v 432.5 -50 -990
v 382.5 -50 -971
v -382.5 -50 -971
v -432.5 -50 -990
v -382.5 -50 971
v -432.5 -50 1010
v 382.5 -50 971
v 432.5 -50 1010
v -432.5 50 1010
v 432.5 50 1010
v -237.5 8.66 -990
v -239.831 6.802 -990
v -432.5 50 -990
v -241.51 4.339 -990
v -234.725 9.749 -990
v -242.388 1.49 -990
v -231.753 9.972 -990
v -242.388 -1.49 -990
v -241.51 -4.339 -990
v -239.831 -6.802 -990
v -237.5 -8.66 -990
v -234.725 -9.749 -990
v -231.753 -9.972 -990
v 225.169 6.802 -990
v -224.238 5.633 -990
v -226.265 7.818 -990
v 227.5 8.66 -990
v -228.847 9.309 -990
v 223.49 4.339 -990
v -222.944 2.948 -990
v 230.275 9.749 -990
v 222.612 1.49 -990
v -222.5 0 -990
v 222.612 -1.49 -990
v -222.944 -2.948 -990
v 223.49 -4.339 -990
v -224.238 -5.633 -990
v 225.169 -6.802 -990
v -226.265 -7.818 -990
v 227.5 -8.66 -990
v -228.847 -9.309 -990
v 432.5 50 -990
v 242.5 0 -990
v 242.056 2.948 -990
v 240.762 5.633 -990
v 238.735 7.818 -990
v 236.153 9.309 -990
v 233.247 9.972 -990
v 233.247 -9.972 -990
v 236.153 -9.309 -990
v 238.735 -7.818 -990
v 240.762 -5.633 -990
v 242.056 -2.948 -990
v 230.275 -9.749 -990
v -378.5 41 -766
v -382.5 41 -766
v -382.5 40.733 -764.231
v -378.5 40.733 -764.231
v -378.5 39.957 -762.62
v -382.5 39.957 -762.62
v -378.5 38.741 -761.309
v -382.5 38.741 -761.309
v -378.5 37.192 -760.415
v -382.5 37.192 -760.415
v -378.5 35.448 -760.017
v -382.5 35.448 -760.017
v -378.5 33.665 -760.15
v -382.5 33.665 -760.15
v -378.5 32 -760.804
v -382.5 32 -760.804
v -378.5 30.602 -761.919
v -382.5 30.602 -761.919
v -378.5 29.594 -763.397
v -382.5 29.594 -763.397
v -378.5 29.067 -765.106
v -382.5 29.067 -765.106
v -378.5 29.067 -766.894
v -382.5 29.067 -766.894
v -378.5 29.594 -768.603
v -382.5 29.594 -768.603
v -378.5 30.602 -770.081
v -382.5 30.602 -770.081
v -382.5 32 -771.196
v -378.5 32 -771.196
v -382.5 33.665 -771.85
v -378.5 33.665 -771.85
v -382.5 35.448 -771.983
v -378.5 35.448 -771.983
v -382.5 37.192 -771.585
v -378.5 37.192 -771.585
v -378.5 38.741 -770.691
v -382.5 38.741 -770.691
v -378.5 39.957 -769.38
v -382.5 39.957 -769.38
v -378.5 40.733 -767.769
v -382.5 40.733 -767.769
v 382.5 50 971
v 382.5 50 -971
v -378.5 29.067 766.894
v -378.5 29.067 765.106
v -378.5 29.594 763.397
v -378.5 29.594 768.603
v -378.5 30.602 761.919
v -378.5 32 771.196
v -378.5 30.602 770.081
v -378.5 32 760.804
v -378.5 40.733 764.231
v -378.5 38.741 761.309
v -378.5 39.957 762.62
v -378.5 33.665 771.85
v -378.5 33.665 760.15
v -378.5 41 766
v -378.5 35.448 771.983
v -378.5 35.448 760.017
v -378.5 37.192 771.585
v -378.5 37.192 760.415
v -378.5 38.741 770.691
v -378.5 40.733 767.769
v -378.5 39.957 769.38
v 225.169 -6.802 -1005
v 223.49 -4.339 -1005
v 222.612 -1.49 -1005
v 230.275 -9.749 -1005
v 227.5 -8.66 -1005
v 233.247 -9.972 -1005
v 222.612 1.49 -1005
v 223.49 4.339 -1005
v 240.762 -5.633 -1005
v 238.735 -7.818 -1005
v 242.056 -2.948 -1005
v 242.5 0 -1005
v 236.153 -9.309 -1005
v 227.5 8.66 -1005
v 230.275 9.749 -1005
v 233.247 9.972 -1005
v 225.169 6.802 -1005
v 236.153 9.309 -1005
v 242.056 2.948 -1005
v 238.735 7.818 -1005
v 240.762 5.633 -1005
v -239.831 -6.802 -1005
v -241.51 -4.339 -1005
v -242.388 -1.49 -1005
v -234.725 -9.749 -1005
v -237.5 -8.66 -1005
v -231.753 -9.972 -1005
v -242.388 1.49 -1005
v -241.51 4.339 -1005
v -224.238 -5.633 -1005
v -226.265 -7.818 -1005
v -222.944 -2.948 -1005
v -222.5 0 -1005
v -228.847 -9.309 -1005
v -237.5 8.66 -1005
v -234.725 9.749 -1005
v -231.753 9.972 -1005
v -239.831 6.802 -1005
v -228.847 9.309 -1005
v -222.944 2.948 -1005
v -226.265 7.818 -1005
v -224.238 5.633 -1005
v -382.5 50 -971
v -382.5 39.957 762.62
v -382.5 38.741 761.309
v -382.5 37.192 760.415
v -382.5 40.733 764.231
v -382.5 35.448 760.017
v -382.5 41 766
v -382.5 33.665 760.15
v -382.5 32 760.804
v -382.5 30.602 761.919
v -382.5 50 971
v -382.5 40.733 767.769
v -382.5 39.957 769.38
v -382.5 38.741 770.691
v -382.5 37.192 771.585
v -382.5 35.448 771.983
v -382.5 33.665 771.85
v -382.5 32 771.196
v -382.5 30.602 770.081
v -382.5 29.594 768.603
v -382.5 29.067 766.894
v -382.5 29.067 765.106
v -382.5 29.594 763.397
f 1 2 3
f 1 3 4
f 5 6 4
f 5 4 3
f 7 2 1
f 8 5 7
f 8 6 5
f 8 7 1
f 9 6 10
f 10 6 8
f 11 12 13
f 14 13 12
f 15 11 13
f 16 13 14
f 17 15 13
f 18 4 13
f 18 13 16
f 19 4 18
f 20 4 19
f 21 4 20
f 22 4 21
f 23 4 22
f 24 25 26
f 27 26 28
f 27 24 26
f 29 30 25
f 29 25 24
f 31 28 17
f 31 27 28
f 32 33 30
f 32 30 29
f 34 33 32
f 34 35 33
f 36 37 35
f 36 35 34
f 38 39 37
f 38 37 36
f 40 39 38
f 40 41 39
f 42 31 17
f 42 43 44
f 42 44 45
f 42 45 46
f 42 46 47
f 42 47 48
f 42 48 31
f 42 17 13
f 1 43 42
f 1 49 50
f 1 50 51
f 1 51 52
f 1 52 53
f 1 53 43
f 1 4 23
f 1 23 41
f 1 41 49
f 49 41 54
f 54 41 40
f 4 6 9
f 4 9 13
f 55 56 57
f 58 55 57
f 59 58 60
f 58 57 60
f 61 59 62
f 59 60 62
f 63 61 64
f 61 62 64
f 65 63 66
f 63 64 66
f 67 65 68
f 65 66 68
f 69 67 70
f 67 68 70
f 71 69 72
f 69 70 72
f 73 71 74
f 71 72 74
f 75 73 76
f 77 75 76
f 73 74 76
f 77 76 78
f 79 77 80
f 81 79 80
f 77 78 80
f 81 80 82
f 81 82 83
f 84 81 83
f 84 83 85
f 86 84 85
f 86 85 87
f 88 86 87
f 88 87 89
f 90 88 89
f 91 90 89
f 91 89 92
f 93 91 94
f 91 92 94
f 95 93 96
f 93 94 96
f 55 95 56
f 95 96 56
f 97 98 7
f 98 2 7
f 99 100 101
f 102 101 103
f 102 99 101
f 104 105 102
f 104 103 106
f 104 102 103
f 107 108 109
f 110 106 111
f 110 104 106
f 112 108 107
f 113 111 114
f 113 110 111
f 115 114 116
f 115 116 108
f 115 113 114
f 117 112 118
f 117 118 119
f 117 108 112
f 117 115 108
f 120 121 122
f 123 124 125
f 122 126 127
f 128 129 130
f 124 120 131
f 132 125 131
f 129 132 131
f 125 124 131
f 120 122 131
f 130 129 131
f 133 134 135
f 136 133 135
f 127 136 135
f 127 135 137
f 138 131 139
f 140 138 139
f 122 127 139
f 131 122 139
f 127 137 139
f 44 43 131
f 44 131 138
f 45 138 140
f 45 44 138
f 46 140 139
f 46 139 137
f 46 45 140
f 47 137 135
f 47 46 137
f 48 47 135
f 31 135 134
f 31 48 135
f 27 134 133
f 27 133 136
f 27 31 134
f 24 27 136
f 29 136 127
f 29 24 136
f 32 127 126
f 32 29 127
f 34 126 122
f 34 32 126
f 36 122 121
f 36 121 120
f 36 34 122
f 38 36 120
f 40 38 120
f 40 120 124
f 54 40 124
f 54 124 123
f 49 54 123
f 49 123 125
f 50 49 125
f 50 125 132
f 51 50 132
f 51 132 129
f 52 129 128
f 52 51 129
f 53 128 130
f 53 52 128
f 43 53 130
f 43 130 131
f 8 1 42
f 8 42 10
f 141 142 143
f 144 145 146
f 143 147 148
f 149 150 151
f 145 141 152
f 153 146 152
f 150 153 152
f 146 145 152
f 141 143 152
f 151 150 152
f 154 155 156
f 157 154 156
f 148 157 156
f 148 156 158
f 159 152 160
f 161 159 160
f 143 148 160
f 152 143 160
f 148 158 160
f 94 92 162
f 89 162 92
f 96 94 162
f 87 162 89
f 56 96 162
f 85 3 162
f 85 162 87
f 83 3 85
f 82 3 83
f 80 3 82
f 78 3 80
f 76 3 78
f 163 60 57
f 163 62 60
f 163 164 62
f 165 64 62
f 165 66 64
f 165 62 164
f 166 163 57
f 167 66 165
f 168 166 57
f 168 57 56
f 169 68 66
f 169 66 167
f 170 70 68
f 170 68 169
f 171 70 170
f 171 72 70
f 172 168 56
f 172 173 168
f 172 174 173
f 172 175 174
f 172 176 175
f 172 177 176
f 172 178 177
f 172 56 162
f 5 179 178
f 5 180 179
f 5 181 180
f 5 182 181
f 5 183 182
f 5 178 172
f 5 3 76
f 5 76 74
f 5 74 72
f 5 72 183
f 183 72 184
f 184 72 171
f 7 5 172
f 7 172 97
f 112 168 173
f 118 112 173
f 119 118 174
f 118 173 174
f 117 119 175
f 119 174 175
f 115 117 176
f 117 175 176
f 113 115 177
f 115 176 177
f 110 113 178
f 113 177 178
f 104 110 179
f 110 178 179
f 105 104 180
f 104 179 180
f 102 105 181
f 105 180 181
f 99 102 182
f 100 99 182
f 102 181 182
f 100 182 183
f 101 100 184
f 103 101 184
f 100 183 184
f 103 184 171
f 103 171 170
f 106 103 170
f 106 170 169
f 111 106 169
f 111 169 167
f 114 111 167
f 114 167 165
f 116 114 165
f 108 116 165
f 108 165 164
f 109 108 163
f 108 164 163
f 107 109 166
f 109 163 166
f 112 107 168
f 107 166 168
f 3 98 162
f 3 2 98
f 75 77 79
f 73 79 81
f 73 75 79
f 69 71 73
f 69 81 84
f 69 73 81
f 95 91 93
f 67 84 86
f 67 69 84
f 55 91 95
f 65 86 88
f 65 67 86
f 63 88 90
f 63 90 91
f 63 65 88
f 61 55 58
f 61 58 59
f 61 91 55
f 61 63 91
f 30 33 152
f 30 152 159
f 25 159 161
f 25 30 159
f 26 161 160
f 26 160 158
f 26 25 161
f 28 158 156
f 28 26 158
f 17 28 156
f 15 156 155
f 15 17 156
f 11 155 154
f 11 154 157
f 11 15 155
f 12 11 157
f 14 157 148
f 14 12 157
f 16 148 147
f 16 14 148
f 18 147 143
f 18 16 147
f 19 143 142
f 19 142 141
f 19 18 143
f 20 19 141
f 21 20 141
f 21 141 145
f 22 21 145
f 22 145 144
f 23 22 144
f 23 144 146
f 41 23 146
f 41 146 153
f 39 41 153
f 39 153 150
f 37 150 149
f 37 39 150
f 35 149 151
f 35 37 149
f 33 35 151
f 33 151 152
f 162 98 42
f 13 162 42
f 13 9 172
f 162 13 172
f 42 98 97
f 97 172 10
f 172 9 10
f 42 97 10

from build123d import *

# Parameters (mm, degrees)
F0_W     = 50
F0_H     = 1942
F0_W_2   = 865
F0_H_2   = 20
F1_DEPTH = 50
F3_R     = 10
F4_DEPTH = 15
F6_R     = 6
F7_DEPTH = 4


with BuildPart() as f1:
    # F0 (on Front) → F1 (new body, symmetric)
    with BuildSketch(Plane.XZ):
        with Locations((-407.5, 0)):
            Rectangle(F0_W, F0_H)
        Polygon((432.5, 990), (-432.5, 990), (-432.5, 971), (-382.5, 971), (382.5, 971), (432.5, 971), align=None)
        with Locations((0, 1000)):
            Rectangle(F0_W_2, F0_H_2)
        with Locations((407.5, 0)):
            Rectangle(F0_W, F0_H)
        Polygon((-382.5, -971), (-432.5, -971), (-432.5, -990), (432.5, -990), (432.5, -971), (382.5, -971), align=None)
    extrude(amount=F1_DEPTH, both=True)

    # F3 (on offset) → F4 (join)
    with BuildSketch(Plane.XY.offset(-990)):
        with Locations((-232.5, 0)):
            Circle(F3_R)
        with Locations((232.5, 0)):
            Circle(F3_R)
    extrude(amount=-F4_DEPTH)

    # F6 (on offset) → F7 (join)
    with BuildSketch(Plane.YZ.offset(-382.5)):
        with Locations((35, 766)):
            Circle(F6_R)
        with Locations((35, -766)):
            Circle(F6_R)
    extrude(amount=F7_DEPTH)


solid = f1.part
